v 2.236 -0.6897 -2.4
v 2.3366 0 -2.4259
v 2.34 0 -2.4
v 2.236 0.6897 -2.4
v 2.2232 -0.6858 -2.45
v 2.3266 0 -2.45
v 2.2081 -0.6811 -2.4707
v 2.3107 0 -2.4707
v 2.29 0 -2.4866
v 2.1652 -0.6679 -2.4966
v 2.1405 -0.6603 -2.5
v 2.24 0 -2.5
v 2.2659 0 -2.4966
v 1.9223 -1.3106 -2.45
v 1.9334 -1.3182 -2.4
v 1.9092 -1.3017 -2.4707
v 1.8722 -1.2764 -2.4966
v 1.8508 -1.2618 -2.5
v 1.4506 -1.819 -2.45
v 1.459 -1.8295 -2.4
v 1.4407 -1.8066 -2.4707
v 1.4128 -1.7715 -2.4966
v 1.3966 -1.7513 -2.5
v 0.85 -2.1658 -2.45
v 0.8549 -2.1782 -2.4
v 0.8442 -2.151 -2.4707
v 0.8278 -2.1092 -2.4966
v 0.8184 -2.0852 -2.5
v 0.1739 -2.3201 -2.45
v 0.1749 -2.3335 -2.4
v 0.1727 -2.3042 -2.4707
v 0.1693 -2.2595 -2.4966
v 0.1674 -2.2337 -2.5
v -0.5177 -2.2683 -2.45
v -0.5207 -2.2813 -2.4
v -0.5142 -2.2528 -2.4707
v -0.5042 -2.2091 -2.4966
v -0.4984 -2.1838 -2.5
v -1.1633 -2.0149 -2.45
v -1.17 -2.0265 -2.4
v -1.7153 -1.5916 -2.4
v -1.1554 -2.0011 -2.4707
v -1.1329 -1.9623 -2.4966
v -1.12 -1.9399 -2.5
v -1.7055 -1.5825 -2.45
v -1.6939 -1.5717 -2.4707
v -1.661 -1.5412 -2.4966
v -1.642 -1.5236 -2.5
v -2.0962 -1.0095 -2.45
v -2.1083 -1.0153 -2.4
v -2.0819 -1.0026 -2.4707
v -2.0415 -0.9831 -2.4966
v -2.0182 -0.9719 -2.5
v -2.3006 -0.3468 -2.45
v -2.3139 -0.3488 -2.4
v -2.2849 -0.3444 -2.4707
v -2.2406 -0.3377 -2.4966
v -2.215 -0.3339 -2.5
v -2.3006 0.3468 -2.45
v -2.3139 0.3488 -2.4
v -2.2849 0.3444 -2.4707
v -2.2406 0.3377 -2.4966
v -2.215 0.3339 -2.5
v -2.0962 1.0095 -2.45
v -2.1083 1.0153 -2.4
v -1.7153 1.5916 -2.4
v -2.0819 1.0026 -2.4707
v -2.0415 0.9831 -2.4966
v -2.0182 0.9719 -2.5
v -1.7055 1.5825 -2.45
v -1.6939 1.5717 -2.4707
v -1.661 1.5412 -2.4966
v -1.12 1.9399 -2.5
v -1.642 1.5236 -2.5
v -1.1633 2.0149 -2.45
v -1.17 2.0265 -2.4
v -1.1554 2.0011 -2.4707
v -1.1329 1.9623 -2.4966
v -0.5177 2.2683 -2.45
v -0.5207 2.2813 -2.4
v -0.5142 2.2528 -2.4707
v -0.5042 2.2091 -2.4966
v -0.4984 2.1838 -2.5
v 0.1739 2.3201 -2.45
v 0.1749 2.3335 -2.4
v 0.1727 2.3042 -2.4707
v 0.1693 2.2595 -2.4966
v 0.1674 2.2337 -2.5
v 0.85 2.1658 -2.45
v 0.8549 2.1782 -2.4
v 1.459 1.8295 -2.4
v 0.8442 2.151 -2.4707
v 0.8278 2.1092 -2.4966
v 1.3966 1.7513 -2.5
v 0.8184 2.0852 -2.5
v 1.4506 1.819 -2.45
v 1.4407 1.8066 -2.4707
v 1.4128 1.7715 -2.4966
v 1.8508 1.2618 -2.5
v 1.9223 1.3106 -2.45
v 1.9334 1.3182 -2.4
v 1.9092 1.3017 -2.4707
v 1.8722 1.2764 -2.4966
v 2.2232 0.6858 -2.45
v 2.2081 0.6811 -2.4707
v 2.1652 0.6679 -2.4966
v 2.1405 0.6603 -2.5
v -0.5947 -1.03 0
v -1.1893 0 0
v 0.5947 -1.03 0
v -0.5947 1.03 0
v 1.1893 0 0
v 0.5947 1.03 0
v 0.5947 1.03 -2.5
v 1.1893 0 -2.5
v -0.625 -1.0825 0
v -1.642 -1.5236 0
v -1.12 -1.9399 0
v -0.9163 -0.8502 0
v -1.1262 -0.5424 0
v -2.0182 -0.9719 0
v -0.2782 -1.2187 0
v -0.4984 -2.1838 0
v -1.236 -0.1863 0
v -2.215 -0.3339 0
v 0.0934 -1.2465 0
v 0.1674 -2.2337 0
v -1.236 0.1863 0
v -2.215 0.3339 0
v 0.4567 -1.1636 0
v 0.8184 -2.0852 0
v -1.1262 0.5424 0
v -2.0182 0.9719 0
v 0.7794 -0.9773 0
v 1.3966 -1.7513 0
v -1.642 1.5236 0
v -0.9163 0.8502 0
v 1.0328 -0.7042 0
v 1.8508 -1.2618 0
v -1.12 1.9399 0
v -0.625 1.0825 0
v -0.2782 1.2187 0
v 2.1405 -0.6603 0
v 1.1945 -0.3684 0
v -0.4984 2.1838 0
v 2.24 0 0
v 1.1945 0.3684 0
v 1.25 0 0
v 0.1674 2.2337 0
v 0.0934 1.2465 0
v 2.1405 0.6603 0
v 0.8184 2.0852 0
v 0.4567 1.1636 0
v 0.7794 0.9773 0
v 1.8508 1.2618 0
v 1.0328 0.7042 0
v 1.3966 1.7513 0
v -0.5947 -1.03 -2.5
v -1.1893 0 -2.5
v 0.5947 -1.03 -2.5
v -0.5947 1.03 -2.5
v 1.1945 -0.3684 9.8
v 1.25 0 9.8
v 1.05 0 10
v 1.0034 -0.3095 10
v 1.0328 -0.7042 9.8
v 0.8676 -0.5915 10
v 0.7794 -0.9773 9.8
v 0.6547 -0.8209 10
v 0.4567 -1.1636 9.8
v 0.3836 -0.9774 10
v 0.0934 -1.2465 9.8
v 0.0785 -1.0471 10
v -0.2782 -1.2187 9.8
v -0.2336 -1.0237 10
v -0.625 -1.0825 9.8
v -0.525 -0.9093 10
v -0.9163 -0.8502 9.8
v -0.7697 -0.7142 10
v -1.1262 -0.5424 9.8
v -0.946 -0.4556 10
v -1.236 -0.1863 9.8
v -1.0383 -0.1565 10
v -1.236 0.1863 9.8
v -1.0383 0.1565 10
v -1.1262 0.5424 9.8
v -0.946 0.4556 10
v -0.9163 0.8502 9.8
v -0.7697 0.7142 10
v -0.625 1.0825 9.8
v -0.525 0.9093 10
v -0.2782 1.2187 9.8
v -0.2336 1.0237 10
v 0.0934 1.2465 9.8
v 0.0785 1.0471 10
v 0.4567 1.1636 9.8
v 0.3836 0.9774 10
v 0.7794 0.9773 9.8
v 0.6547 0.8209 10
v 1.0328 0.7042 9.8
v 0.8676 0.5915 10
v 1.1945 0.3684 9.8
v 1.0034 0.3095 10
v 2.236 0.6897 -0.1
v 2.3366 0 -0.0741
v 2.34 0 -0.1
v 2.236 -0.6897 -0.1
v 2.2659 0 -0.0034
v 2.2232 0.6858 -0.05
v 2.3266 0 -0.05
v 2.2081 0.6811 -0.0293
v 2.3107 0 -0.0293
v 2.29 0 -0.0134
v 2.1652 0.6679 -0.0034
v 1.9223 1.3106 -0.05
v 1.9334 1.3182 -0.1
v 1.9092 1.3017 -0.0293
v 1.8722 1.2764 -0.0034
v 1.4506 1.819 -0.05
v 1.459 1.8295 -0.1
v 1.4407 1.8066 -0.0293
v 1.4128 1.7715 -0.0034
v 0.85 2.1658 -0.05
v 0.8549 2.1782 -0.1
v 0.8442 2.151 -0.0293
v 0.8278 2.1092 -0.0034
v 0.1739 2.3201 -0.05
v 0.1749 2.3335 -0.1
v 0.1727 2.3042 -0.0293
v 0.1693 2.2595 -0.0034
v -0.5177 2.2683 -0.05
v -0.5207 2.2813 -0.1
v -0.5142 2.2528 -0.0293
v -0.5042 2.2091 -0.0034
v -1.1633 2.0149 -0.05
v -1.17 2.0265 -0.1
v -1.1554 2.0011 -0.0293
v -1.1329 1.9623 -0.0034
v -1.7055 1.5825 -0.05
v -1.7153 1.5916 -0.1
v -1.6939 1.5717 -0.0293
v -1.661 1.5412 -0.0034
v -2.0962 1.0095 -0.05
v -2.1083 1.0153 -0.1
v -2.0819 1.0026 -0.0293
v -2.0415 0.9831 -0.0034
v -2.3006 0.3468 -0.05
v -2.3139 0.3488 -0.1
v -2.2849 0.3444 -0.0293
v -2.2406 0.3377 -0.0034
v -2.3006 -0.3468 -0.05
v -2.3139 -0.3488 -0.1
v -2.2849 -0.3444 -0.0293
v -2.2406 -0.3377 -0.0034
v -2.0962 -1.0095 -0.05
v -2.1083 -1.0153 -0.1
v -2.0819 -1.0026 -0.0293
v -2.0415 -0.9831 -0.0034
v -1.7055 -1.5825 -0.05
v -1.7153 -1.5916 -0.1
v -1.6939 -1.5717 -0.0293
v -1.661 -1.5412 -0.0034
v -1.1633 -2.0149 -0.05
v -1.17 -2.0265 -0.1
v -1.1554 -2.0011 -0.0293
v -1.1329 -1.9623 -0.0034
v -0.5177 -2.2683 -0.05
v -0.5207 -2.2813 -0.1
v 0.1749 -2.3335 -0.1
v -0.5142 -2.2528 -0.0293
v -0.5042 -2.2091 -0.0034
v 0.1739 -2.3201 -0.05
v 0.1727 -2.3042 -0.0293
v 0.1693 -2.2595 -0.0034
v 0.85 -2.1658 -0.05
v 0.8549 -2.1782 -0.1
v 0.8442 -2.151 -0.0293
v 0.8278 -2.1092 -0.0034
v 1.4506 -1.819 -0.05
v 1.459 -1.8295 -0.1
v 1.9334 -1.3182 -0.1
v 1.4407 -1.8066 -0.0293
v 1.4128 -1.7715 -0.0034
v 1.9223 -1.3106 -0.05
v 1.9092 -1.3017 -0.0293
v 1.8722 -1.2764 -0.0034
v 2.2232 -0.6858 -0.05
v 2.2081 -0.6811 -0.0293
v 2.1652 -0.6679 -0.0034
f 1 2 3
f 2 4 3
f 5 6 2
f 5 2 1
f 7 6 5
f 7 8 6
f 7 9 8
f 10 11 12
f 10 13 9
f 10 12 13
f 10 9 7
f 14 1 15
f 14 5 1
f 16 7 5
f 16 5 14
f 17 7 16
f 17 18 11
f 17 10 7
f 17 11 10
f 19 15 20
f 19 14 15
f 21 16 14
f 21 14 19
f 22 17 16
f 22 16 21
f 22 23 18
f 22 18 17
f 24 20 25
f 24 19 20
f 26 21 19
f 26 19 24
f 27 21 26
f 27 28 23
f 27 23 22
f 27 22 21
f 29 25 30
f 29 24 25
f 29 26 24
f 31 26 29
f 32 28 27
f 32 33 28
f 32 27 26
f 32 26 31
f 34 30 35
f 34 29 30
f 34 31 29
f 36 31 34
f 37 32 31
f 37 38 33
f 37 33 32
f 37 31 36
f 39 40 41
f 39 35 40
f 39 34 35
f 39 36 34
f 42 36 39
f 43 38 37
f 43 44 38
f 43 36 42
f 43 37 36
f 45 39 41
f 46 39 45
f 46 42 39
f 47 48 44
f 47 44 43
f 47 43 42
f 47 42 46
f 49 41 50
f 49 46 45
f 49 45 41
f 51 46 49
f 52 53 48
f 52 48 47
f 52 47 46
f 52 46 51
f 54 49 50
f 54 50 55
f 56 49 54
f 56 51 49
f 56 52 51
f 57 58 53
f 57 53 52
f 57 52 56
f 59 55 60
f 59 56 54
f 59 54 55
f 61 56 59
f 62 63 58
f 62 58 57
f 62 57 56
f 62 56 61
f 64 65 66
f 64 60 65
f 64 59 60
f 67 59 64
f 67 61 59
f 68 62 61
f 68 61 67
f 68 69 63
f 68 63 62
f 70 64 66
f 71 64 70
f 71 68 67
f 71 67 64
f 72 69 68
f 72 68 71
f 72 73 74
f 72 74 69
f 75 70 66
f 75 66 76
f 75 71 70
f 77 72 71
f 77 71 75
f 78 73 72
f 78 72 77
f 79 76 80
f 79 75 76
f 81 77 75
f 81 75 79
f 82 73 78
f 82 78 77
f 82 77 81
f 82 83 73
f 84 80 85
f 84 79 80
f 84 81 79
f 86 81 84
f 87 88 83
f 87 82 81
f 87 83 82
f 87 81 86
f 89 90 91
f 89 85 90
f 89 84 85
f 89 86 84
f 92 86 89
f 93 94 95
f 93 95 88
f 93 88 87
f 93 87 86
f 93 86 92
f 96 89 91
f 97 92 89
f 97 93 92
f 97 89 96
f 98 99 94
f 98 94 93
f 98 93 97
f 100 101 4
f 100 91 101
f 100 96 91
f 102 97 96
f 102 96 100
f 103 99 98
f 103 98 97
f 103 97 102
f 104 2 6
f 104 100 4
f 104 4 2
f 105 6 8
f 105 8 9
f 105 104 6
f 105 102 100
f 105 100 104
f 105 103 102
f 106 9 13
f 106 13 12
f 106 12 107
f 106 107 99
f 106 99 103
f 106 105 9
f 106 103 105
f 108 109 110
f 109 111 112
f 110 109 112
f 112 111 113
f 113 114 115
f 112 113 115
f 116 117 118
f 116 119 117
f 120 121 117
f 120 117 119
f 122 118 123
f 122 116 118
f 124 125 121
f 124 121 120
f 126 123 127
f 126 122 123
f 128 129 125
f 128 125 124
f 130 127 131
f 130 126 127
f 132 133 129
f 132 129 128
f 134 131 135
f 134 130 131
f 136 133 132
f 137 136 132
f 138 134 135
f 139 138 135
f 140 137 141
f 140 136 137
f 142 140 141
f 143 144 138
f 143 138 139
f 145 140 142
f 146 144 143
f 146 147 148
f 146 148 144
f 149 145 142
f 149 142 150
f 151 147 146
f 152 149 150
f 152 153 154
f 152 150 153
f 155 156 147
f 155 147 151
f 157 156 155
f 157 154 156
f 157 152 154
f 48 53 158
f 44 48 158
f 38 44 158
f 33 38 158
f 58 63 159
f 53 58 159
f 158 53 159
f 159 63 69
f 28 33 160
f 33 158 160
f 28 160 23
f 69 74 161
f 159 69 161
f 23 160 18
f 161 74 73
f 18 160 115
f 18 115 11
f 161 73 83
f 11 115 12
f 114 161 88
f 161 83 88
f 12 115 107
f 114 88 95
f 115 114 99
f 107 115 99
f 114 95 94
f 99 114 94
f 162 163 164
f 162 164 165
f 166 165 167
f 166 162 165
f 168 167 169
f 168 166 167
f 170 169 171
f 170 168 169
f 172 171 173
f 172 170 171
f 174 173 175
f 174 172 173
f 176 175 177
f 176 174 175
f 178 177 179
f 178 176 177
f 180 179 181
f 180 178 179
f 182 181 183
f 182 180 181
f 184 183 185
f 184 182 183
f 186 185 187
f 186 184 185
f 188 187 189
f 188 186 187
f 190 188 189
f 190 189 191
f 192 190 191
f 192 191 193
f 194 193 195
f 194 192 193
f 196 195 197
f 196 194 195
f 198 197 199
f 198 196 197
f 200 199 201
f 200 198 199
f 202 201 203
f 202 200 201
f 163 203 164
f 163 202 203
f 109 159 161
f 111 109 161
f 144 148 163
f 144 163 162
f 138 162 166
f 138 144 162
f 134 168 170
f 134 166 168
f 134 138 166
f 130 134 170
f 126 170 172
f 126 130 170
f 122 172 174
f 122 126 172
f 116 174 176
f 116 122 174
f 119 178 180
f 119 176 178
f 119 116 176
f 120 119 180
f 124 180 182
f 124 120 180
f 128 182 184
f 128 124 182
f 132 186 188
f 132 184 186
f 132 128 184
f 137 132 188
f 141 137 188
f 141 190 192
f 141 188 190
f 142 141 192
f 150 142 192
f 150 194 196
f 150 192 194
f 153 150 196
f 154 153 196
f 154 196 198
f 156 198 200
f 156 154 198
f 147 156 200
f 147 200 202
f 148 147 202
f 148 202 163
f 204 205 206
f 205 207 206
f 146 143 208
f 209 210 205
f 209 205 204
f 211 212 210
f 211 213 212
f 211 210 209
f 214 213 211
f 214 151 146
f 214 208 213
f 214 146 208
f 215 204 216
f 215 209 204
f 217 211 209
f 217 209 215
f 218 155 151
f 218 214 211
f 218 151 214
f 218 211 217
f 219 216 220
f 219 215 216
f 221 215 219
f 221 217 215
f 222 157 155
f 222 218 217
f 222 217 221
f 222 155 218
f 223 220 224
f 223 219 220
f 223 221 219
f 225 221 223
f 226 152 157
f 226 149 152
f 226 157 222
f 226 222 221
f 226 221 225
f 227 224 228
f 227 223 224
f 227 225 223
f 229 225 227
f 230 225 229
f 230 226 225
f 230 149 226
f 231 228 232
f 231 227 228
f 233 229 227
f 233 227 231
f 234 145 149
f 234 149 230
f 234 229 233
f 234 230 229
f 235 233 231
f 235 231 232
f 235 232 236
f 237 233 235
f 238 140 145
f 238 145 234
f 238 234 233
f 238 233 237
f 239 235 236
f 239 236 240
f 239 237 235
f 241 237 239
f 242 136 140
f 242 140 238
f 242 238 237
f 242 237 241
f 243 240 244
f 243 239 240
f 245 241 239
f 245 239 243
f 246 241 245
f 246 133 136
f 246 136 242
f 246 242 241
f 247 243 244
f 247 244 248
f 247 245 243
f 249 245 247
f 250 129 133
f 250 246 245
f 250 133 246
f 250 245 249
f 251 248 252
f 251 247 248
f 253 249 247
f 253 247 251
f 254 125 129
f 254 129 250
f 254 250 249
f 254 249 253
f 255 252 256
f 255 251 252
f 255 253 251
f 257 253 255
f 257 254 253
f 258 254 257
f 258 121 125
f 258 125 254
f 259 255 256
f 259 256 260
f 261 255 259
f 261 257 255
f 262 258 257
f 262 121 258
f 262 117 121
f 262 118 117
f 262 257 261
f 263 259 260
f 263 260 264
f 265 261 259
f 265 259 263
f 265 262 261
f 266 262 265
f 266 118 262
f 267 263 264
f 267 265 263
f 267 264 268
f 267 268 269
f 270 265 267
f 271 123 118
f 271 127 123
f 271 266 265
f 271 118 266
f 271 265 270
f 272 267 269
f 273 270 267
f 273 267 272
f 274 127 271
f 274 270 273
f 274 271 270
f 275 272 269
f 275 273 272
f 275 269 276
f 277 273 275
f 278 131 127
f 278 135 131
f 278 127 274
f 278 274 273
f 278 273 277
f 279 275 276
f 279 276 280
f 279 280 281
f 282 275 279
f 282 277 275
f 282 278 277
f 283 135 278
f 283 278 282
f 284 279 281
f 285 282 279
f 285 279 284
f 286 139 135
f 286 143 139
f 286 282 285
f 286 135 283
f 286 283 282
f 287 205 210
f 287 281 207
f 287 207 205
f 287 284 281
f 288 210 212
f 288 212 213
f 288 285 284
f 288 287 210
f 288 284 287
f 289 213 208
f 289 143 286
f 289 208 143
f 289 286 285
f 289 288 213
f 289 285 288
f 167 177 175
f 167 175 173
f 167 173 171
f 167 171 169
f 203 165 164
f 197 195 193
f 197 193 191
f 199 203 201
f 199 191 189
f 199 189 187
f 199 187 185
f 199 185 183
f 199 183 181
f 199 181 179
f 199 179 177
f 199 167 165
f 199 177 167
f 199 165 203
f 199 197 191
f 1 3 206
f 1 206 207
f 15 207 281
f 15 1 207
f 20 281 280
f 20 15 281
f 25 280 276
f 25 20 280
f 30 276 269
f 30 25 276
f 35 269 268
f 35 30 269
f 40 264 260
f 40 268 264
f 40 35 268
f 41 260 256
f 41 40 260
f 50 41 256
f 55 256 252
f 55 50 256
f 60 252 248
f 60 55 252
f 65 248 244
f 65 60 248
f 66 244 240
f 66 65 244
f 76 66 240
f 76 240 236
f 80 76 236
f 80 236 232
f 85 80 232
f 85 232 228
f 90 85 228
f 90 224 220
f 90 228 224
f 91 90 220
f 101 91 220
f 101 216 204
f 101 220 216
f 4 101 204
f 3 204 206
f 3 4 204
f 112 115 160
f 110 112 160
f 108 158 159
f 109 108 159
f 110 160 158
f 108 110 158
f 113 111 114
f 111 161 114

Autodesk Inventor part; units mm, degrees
ref_plane "YZ Plane" through (0, 0, 0) normal (1, 0, 0) x (0, 1, 0)
ref_plane "XZ Plane" through (0, 0, 0) normal (0, 1, 0) x (-1, 0, 0)
ref_plane "Work Plane1" through (0, 0, -2.5) normal (0, 0, 1) x (1, 0, 0)
sketch "Sketch1" plane through (0, 0, -2.5) normal (0, 0, 1) x (1, 0, 0)
  circle A0 centre (0, 0) radius 2.34
extrude "Extrusion3" add sketch "Sketch1" along normal blind 2.5
sketch "Sketch2" plane through (0, 0, 0) normal (0, 0, 1) x (1, 0, 0)
  circle A0 centre (0, 0) radius 1.25
extrude "Extrusion2" add sketch "Sketch2" along normal blind 10
sketch "Sketch3" plane through (0, 0, -2.5) normal (0, 0, 1) x (1, 0, 0)
  line L0 (0.5947, -1.03) -> (-0.5947, -1.03)
  line L1 (0.5947, 1.03) -> (1.1893, 0)
  line L2 (-0.5947, -1.03) -> (-1.1893, 0)
  line L3 (-1.1893, 0) -> (-0.5947, 1.03)
  line L4 (1.1893, 0) -> (0.5947, -1.03)
  line L5 (-0.5947, 1.03) -> (0.5947, 1.03)
extrude "Extrusion1" cut sketch "Sketch3" along normal blind 2.5
fillet "Fillet1" radius 0.1 2 edges at (-2.34, 0, 0) (-2.34, 0, -2.5)
chamfer "Chamfer1" distance 0.2 angle 45 1 edges at (-1.25, 0, 10)
properties part number "M2.5 x 10mm SHCS"
